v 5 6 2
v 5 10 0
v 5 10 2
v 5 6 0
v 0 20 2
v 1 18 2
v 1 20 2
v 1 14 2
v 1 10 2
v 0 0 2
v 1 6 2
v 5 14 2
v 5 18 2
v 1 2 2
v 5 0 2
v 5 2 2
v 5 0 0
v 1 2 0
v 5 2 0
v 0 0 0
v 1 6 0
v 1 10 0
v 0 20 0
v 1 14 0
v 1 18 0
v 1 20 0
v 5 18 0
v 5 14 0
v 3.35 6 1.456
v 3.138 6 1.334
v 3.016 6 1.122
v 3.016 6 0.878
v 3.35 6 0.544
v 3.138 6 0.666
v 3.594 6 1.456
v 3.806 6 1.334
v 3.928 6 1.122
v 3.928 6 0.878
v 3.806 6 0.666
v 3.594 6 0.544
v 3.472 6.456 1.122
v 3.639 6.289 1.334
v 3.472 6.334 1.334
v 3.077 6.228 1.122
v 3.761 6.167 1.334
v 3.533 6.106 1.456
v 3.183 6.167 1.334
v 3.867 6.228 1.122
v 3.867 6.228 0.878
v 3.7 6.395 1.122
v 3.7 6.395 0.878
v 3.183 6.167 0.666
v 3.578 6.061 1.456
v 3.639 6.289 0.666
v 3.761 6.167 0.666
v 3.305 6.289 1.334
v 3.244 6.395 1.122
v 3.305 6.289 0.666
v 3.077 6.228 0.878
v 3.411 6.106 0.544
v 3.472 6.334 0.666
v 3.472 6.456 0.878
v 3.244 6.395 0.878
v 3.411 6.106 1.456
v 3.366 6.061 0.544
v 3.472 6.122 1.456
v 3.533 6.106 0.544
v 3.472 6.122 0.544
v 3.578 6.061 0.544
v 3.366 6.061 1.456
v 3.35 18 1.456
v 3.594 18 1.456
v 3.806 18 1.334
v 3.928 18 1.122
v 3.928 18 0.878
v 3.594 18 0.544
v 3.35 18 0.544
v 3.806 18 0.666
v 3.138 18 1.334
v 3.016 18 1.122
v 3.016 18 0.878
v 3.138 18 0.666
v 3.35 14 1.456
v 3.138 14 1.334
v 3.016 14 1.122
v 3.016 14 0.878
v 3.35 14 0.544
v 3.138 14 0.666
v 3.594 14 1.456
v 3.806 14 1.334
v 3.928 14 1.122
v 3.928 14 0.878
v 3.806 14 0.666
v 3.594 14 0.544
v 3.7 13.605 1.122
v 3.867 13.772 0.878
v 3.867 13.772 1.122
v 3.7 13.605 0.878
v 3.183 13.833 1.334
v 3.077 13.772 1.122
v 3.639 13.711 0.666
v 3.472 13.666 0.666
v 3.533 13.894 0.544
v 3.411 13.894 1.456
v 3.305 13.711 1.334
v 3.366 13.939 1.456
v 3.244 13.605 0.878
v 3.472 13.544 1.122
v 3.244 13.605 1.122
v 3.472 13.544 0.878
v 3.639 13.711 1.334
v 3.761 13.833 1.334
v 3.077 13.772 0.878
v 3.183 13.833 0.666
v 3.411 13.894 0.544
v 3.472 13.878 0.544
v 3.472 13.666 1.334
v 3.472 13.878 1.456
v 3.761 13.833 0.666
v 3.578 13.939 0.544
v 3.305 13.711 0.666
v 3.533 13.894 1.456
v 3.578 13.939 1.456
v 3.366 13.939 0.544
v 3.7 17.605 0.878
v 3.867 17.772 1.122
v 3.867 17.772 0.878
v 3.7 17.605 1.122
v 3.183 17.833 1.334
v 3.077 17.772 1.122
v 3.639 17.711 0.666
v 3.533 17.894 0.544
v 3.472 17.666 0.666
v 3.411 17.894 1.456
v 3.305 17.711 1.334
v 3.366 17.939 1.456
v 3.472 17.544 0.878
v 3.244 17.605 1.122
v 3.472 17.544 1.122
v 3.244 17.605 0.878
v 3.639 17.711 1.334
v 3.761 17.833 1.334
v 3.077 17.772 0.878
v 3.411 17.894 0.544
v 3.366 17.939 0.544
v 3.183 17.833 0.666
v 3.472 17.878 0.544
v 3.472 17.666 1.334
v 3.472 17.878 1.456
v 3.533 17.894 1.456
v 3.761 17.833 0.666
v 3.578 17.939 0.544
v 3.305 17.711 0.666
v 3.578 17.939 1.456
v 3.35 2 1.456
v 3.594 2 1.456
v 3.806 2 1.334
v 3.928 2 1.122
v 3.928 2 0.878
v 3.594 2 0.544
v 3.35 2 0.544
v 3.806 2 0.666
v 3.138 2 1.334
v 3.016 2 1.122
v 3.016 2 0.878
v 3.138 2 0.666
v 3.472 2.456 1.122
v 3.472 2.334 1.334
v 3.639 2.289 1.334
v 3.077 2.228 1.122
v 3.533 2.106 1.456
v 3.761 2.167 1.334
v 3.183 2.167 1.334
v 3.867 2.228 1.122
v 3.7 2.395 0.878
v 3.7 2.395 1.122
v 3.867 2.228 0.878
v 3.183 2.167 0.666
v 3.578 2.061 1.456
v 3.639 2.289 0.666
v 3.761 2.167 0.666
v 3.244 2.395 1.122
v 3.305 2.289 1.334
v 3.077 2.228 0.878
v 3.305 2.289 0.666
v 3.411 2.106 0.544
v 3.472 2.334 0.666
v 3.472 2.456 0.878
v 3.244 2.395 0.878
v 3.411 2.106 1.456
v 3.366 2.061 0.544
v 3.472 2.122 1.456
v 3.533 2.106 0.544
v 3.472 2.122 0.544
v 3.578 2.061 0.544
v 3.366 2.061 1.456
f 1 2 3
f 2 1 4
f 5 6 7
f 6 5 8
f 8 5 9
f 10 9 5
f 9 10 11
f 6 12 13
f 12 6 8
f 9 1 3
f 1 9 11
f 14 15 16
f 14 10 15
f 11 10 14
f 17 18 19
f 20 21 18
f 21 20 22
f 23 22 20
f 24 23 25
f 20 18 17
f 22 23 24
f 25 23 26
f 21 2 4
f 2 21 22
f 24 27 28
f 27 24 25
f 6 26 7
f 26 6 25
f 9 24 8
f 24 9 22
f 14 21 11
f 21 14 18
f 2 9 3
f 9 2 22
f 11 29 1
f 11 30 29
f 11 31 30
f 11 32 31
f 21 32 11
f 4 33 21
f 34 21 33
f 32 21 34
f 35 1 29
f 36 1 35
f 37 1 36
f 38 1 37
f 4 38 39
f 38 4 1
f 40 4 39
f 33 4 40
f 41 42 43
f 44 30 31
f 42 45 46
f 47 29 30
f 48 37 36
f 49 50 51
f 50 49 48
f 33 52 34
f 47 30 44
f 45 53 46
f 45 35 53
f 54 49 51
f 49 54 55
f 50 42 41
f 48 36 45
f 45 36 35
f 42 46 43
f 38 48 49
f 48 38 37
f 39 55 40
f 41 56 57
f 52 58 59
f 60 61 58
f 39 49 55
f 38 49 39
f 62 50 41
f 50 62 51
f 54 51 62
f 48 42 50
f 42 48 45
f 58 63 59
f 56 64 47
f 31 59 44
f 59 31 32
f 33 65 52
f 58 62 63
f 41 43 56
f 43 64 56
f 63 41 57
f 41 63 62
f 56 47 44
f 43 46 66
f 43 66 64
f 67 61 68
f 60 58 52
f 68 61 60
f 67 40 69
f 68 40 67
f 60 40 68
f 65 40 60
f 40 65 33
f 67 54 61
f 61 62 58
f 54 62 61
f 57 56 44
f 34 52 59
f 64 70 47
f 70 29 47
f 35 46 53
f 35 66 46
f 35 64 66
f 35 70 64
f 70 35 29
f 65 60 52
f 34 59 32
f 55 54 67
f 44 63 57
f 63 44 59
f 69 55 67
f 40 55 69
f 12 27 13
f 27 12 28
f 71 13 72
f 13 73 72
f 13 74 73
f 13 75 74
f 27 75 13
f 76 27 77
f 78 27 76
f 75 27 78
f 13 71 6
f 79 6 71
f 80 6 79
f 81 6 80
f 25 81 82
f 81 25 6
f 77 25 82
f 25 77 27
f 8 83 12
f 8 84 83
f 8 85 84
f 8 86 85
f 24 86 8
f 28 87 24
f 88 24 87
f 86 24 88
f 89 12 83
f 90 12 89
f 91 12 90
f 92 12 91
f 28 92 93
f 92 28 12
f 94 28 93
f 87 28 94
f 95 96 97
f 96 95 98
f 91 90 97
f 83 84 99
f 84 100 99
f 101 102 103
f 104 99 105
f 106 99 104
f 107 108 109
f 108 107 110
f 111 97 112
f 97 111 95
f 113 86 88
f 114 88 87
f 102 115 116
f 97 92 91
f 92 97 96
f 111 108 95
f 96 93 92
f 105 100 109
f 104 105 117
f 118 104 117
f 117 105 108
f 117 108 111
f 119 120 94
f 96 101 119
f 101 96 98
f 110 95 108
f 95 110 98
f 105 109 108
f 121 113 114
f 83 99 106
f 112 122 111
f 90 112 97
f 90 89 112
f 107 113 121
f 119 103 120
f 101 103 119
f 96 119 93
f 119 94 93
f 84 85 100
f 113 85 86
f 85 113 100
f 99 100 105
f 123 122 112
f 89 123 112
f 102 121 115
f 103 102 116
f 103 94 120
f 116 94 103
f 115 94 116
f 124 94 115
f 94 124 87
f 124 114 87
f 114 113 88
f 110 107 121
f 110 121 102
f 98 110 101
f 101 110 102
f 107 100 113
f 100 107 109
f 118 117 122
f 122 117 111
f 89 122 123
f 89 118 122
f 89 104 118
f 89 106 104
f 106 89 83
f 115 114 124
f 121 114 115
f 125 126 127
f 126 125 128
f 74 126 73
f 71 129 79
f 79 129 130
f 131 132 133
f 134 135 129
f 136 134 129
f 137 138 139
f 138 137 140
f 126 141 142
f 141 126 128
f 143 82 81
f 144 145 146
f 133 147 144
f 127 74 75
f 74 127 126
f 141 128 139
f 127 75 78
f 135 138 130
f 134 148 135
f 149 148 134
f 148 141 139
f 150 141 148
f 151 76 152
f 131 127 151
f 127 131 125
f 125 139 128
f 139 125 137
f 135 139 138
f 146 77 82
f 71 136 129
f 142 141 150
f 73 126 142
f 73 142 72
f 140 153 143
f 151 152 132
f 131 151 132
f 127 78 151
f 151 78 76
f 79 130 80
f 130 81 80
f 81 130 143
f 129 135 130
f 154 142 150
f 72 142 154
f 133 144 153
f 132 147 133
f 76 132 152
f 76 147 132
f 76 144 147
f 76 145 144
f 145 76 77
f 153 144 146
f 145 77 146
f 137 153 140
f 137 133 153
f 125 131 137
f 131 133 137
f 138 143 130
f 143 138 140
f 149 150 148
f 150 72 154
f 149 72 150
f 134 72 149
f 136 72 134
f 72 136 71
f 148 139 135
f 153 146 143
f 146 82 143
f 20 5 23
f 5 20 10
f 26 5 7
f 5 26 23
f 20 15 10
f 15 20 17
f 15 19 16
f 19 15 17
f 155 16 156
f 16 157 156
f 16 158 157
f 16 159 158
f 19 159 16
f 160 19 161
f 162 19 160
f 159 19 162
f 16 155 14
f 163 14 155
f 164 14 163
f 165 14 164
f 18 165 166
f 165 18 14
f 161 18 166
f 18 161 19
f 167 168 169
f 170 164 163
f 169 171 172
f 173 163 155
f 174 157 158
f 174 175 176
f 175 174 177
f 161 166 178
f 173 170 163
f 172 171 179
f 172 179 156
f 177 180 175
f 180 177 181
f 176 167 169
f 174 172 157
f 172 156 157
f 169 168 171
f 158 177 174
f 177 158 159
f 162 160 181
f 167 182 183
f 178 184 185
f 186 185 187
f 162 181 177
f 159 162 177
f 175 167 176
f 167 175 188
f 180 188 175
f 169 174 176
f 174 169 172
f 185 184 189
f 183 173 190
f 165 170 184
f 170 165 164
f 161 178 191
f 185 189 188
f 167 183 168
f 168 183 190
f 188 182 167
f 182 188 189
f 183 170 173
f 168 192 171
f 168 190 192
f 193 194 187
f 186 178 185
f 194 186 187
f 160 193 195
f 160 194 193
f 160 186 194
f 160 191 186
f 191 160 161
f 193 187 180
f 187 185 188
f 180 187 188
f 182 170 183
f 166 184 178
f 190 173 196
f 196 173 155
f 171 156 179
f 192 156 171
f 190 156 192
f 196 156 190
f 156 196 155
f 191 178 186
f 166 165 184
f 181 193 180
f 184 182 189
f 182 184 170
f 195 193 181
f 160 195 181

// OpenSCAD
goldenratio = 1.6180339;

//hinge(2, 15, 4, $fn=12);
hinge(2, 20, 4, $fn=12);

module hinge(thickness, length, notchdepth)
{
	joinwidth = 1;
	joinfactor = 0.25;

	notchlength = length / 5;
	halfnotchlength = notchlength / 2;

	dimpleradius = thickness/goldenratio/goldenratio/goldenratio;  // Not the same as... //dimpleradius = thickness/(goldenratio*3);
	
	dimpleoffset = notchdepth / goldenratio;

	// First, lay down an area that can be joined to other objects
	// lay it flat in the x-y plane
	cube(size=[joinwidth, length, thickness]);

	// Lay in the tongues

	// First tongue is a half notch with an extruded dimple
	translate([joinwidth, 0, 0])
	cube(size=[notchdepth, halfnotchlength, thickness]);
	translate([joinwidth+dimpleoffset, halfnotchlength, thickness/2])
	sphere(r=dimpleradius);

	// Second tongue has a recess in the near side
	difference()
	{
		translate([joinwidth, halfnotchlength+notchlength, 0])
		cube(size=[notchdepth, notchlength, thickness]);
	
		translate([joinwidth+dimpleoffset, halfnotchlength+notchlength, thickness/2])
		sphere(r=dimpleradius);
	}

	// The last tongue has both a extrusion and intrusion
	// extrusion on the near side, intrusion far side
	difference()
	{
		union()
		{	
			translate([joinwidth, halfnotchlength+3*notchlength, 0])
			cube(size=[notchdepth, notchlength, thickness]);
	
			translate([joinwidth+dimpleoffset, halfnotchlength+3*notchlength, thickness/2])
			sphere(r=dimpleradius);
	
		}
		translate([joinwidth+dimpleoffset, halfnotchlength+4*notchlength, thickness/2])
		sphere(r=dimpleradius);
	}
}
